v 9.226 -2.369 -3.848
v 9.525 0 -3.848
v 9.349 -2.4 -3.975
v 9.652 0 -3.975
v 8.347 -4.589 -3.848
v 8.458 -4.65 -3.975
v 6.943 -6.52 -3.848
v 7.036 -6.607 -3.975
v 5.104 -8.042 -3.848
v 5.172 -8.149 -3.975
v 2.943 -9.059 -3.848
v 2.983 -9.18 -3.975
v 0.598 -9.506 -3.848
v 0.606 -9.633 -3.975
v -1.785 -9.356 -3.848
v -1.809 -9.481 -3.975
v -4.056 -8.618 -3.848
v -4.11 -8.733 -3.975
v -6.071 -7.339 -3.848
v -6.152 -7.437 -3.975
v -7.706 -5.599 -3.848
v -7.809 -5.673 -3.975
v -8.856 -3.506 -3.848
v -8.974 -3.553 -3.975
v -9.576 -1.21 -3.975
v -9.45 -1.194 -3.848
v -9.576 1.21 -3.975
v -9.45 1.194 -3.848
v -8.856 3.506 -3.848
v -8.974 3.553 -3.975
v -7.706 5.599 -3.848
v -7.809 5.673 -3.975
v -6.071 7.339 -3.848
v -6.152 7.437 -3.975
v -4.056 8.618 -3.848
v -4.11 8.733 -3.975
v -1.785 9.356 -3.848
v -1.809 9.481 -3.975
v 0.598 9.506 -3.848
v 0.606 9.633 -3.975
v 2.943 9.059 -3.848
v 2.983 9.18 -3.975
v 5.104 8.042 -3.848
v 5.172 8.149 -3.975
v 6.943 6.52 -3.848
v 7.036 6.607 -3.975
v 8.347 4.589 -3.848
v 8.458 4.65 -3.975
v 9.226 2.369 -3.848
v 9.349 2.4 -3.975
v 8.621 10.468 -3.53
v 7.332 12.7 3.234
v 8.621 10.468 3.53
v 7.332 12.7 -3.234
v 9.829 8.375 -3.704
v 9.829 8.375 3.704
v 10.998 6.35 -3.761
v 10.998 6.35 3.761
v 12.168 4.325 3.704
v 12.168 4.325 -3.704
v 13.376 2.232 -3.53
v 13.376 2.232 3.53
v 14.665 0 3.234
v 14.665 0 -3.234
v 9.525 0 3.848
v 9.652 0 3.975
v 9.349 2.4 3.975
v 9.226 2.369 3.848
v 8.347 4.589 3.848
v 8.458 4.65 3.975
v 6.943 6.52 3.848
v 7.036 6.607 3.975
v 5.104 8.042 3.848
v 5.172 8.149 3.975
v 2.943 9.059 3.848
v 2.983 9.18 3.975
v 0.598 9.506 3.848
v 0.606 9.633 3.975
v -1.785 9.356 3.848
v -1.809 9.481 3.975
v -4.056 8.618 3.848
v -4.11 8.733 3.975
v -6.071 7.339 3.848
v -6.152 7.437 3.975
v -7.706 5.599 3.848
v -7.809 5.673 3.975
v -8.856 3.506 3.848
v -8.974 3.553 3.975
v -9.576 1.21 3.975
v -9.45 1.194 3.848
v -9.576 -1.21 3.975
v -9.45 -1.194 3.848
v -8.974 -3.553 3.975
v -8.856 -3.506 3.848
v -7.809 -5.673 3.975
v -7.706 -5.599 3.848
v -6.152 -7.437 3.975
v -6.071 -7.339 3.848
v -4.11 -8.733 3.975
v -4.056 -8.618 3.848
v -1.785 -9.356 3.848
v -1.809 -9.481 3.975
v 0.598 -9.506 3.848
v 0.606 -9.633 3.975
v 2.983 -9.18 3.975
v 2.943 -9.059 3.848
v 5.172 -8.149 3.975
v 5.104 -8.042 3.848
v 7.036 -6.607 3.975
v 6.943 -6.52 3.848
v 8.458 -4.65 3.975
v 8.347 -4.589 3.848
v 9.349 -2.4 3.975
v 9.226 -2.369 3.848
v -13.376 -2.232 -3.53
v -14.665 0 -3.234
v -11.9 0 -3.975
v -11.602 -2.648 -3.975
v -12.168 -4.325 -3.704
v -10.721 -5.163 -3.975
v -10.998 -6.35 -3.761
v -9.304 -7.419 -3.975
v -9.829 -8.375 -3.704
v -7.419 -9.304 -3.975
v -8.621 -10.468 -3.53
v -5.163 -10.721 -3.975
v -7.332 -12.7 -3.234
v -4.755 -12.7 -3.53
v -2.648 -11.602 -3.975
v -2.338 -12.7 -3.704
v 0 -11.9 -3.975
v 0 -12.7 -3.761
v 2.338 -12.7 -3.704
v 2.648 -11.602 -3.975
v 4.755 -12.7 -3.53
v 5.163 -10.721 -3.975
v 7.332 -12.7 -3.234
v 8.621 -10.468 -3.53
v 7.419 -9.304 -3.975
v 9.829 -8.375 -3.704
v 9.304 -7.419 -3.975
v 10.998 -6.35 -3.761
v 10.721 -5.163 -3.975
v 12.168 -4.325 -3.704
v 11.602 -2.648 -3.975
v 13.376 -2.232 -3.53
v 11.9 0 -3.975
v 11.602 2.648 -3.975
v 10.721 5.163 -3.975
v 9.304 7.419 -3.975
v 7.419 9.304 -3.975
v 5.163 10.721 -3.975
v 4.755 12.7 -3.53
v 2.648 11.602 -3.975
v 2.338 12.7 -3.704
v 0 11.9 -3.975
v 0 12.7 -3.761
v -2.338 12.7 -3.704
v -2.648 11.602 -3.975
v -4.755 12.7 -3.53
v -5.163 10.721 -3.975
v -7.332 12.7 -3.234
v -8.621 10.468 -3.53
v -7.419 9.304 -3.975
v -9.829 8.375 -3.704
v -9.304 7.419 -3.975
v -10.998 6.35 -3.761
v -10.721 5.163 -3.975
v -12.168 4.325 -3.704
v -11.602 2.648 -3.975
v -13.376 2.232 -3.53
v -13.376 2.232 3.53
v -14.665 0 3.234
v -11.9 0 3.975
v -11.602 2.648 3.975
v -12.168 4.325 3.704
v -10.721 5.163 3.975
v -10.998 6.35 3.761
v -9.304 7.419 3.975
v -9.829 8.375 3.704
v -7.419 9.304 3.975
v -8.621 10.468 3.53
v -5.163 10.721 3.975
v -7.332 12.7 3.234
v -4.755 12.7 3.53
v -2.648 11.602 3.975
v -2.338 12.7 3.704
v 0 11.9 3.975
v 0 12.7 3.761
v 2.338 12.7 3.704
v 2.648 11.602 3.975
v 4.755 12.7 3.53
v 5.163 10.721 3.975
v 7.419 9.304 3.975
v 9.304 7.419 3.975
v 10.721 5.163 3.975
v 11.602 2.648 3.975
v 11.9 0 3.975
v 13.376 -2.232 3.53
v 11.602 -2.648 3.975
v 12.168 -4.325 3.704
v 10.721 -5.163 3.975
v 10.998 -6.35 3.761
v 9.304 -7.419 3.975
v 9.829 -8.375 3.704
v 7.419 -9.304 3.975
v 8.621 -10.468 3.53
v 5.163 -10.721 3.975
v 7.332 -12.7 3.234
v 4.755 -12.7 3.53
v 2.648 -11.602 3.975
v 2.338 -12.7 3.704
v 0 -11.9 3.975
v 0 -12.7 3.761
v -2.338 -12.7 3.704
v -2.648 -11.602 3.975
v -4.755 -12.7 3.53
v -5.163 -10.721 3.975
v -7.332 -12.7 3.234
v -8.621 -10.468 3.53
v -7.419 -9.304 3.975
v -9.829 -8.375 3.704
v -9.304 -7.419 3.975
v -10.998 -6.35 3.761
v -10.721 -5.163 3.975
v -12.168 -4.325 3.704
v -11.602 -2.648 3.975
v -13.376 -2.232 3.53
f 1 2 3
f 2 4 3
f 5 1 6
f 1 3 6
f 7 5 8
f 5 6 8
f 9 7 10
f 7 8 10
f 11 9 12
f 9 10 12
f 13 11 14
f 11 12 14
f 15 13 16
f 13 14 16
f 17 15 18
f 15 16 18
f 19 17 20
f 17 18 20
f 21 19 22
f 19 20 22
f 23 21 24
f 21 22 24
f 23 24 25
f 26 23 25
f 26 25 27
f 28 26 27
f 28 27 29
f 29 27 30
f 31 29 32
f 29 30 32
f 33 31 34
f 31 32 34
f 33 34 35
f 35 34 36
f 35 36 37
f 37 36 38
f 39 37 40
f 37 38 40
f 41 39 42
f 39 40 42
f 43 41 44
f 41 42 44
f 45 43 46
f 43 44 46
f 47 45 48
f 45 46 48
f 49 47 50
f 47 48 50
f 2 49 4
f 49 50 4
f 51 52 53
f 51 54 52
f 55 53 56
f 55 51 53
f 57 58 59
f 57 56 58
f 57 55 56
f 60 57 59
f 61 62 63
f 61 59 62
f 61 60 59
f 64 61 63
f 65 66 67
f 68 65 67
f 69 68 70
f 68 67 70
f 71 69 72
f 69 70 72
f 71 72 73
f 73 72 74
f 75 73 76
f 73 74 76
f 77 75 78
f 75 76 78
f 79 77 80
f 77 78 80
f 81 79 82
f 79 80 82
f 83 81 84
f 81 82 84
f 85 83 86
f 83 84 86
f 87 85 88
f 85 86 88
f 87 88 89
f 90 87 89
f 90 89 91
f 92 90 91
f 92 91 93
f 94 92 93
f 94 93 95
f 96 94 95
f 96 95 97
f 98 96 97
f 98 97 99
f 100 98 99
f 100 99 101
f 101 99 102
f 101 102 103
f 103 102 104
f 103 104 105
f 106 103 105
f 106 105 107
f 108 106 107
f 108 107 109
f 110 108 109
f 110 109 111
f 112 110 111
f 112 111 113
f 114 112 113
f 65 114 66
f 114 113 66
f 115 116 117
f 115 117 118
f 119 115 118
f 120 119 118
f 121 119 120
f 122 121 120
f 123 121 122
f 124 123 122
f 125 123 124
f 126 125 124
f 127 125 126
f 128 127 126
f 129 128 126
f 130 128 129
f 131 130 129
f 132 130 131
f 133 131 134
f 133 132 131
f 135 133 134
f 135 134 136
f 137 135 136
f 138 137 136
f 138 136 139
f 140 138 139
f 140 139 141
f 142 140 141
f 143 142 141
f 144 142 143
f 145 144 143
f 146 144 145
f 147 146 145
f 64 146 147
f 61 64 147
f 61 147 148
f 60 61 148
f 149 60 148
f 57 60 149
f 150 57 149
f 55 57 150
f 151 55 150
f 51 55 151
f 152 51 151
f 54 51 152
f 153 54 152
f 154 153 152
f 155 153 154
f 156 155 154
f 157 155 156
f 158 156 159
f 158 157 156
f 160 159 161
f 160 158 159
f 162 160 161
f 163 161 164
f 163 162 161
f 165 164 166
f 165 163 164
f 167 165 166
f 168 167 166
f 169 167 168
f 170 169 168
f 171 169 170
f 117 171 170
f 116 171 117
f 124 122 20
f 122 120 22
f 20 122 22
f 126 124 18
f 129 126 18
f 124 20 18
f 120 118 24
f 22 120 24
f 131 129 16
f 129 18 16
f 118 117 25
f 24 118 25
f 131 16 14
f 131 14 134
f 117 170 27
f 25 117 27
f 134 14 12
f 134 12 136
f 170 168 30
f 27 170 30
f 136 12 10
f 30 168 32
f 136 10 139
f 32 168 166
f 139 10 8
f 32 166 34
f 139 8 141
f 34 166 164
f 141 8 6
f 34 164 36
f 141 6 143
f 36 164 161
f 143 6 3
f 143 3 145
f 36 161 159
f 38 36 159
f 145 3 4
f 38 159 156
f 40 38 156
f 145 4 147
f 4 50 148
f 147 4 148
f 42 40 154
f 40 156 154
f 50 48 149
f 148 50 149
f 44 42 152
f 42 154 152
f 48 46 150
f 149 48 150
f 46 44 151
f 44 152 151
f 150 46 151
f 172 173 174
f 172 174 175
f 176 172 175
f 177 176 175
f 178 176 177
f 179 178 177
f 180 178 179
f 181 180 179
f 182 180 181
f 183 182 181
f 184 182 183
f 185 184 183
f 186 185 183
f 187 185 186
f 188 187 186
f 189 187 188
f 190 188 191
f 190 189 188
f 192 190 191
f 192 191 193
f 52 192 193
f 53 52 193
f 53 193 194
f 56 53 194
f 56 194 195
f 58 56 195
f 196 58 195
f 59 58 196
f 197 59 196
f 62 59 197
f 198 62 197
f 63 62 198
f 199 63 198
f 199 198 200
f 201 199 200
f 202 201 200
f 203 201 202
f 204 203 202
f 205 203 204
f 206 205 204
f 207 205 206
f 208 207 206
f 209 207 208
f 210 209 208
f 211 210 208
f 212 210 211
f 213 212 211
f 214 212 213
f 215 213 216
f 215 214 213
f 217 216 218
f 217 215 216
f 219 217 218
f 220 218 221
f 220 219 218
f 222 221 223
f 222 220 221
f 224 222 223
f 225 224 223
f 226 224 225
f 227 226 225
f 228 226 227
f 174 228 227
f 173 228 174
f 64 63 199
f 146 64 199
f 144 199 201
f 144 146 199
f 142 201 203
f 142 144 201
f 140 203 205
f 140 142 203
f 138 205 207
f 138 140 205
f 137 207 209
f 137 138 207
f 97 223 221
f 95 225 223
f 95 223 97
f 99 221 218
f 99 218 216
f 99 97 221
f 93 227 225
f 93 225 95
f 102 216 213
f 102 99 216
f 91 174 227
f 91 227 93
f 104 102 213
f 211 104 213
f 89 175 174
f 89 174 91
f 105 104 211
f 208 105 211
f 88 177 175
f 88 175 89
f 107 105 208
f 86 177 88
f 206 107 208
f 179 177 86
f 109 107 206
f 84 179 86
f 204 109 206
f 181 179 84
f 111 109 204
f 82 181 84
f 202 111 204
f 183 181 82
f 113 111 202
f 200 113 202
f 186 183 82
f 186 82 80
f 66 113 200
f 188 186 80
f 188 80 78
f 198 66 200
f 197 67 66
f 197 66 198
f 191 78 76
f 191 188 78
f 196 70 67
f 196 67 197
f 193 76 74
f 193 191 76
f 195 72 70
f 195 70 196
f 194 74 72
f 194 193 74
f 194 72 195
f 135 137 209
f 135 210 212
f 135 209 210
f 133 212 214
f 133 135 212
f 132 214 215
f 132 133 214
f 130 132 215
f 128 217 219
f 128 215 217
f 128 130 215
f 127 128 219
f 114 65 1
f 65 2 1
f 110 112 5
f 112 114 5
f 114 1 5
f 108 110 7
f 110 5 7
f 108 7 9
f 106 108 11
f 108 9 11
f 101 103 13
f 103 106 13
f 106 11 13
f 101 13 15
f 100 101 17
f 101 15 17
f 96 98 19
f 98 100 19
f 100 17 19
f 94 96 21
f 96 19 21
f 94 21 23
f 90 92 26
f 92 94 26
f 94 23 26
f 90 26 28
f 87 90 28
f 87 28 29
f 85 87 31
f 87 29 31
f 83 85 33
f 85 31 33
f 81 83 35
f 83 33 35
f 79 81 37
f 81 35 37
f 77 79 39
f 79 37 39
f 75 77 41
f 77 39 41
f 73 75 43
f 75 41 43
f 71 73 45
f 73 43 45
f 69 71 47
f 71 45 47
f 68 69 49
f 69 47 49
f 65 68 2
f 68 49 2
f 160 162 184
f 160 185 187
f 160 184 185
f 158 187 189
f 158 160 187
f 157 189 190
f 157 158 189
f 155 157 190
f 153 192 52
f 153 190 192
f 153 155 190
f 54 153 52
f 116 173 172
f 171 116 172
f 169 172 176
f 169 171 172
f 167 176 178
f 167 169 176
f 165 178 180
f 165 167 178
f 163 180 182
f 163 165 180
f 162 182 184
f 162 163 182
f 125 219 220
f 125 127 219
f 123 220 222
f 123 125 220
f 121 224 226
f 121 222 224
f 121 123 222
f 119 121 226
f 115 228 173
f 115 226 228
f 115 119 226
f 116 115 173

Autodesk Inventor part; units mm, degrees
ref_plane "YZ Plane" through (0, 0, 0) normal (1, 0, 0) x (0, 1, 0)
ref_plane "XZ Plane" through (0, 0, 0) normal (0, 1, 0) x (-1, 0, 0)
ref_plane "XY Plane" through (0, 0, 0) normal (0, 0, 1) x (1, 0, 0)
sketch "Sketch1" plane through (0, 0, 0) normal (0, 0, 1) x (1, 0, 0)
  line L0 (-7.3323, 12.7) -> (7.3323, 12.7)
  line L1 (7.3323, 12.7) -> (14.6647, 0)
  line L2 (14.6647, 0) -> (7.3323, -12.7)
  line L3 (7.3323, -12.7) -> (-7.3323, -12.7)
  line L4 (-7.3323, -12.7) -> (-14.6647, 0)
  line L5 (-14.6647, 0) -> (-7.3323, 12.7)
  circle A0 centre (0, 0) radius 9.525
  dimension "d0" = 25.4
  dimension "d1" = 19.05
extrude "Extrusion1" add sketch "Sketch1" along normal mid plane 7.9502
chamfer "Chamfer1" distance 0.127 angle 45 2 edges at (-9.525, 0, 3.9751) (-9.525, 0, -3.9751)
sketch "Sketch2" plane through (0, 0, 0) normal (0, 1, 0) x (-1, 0, 0)
  line L0 (11.8999, 3.9751) -> (14.6647, 3.2343)
  line L1 (14.6647, 3.2343) -> (14.6647, 3.9751)
  line L2 (14.6647, 3.9751) -> (11.8999, 3.9751)
  line L3 (14.6647, 3.9751) -> (7.3323, 3.9751) construction
  line L4 (7.3323, 3.9751) -> (7.3323, -3.9751) construction
  line L5 (14.6647, 3.9751) -> (7.3323, 3.9751) construction
  line L6 (14.6647, 3.9751) -> (14.6647, -3.9751) construction
  line L7 (7.3323, -3.9751) -> (14.6647, -3.9751) construction
  line L8 (0, 0) -> (14.6647, 0) construction
  line L9 (11.8999, -3.9751) -> (14.6647, -3.2343)
  line L10 (14.6647, -3.2343) -> (14.6647, -3.9751)
  line L11 (14.6647, -3.9751) -> (11.8999, -3.9751)
  line L12 (0, -3.8938) -> (0, 3.8938) projected
  dimension "d7" = 11.8999
  dimension "d8" = 15
revolve "Revolution1" cut sketch "Sketch2" angle 360 about axis through (0, 0, -10) along (0, 0, 1)
thread "Thread1" size "3/4-16 UNF" class "3B" standard "ANSI Unified Screw Threads" full length
equation "\"d0\" = AN924_A"
equation "\"d1\" = AN924_T"
equation "\"d2\" = AN924_B"
equation "\"d7\" = 0.5 * AN924_G"
equation "\"AN924_A\" = 25.4"
equation "\"AN924_B\" = 7.9502"
equation "\"AN924_G\" = 23.7998"
equation "\"AN924_T\" = 19.05"
equation "\"Tube_OD\" = 12.7"
properties part number "AN924-8D" material "Aluminum 2014-T6"
